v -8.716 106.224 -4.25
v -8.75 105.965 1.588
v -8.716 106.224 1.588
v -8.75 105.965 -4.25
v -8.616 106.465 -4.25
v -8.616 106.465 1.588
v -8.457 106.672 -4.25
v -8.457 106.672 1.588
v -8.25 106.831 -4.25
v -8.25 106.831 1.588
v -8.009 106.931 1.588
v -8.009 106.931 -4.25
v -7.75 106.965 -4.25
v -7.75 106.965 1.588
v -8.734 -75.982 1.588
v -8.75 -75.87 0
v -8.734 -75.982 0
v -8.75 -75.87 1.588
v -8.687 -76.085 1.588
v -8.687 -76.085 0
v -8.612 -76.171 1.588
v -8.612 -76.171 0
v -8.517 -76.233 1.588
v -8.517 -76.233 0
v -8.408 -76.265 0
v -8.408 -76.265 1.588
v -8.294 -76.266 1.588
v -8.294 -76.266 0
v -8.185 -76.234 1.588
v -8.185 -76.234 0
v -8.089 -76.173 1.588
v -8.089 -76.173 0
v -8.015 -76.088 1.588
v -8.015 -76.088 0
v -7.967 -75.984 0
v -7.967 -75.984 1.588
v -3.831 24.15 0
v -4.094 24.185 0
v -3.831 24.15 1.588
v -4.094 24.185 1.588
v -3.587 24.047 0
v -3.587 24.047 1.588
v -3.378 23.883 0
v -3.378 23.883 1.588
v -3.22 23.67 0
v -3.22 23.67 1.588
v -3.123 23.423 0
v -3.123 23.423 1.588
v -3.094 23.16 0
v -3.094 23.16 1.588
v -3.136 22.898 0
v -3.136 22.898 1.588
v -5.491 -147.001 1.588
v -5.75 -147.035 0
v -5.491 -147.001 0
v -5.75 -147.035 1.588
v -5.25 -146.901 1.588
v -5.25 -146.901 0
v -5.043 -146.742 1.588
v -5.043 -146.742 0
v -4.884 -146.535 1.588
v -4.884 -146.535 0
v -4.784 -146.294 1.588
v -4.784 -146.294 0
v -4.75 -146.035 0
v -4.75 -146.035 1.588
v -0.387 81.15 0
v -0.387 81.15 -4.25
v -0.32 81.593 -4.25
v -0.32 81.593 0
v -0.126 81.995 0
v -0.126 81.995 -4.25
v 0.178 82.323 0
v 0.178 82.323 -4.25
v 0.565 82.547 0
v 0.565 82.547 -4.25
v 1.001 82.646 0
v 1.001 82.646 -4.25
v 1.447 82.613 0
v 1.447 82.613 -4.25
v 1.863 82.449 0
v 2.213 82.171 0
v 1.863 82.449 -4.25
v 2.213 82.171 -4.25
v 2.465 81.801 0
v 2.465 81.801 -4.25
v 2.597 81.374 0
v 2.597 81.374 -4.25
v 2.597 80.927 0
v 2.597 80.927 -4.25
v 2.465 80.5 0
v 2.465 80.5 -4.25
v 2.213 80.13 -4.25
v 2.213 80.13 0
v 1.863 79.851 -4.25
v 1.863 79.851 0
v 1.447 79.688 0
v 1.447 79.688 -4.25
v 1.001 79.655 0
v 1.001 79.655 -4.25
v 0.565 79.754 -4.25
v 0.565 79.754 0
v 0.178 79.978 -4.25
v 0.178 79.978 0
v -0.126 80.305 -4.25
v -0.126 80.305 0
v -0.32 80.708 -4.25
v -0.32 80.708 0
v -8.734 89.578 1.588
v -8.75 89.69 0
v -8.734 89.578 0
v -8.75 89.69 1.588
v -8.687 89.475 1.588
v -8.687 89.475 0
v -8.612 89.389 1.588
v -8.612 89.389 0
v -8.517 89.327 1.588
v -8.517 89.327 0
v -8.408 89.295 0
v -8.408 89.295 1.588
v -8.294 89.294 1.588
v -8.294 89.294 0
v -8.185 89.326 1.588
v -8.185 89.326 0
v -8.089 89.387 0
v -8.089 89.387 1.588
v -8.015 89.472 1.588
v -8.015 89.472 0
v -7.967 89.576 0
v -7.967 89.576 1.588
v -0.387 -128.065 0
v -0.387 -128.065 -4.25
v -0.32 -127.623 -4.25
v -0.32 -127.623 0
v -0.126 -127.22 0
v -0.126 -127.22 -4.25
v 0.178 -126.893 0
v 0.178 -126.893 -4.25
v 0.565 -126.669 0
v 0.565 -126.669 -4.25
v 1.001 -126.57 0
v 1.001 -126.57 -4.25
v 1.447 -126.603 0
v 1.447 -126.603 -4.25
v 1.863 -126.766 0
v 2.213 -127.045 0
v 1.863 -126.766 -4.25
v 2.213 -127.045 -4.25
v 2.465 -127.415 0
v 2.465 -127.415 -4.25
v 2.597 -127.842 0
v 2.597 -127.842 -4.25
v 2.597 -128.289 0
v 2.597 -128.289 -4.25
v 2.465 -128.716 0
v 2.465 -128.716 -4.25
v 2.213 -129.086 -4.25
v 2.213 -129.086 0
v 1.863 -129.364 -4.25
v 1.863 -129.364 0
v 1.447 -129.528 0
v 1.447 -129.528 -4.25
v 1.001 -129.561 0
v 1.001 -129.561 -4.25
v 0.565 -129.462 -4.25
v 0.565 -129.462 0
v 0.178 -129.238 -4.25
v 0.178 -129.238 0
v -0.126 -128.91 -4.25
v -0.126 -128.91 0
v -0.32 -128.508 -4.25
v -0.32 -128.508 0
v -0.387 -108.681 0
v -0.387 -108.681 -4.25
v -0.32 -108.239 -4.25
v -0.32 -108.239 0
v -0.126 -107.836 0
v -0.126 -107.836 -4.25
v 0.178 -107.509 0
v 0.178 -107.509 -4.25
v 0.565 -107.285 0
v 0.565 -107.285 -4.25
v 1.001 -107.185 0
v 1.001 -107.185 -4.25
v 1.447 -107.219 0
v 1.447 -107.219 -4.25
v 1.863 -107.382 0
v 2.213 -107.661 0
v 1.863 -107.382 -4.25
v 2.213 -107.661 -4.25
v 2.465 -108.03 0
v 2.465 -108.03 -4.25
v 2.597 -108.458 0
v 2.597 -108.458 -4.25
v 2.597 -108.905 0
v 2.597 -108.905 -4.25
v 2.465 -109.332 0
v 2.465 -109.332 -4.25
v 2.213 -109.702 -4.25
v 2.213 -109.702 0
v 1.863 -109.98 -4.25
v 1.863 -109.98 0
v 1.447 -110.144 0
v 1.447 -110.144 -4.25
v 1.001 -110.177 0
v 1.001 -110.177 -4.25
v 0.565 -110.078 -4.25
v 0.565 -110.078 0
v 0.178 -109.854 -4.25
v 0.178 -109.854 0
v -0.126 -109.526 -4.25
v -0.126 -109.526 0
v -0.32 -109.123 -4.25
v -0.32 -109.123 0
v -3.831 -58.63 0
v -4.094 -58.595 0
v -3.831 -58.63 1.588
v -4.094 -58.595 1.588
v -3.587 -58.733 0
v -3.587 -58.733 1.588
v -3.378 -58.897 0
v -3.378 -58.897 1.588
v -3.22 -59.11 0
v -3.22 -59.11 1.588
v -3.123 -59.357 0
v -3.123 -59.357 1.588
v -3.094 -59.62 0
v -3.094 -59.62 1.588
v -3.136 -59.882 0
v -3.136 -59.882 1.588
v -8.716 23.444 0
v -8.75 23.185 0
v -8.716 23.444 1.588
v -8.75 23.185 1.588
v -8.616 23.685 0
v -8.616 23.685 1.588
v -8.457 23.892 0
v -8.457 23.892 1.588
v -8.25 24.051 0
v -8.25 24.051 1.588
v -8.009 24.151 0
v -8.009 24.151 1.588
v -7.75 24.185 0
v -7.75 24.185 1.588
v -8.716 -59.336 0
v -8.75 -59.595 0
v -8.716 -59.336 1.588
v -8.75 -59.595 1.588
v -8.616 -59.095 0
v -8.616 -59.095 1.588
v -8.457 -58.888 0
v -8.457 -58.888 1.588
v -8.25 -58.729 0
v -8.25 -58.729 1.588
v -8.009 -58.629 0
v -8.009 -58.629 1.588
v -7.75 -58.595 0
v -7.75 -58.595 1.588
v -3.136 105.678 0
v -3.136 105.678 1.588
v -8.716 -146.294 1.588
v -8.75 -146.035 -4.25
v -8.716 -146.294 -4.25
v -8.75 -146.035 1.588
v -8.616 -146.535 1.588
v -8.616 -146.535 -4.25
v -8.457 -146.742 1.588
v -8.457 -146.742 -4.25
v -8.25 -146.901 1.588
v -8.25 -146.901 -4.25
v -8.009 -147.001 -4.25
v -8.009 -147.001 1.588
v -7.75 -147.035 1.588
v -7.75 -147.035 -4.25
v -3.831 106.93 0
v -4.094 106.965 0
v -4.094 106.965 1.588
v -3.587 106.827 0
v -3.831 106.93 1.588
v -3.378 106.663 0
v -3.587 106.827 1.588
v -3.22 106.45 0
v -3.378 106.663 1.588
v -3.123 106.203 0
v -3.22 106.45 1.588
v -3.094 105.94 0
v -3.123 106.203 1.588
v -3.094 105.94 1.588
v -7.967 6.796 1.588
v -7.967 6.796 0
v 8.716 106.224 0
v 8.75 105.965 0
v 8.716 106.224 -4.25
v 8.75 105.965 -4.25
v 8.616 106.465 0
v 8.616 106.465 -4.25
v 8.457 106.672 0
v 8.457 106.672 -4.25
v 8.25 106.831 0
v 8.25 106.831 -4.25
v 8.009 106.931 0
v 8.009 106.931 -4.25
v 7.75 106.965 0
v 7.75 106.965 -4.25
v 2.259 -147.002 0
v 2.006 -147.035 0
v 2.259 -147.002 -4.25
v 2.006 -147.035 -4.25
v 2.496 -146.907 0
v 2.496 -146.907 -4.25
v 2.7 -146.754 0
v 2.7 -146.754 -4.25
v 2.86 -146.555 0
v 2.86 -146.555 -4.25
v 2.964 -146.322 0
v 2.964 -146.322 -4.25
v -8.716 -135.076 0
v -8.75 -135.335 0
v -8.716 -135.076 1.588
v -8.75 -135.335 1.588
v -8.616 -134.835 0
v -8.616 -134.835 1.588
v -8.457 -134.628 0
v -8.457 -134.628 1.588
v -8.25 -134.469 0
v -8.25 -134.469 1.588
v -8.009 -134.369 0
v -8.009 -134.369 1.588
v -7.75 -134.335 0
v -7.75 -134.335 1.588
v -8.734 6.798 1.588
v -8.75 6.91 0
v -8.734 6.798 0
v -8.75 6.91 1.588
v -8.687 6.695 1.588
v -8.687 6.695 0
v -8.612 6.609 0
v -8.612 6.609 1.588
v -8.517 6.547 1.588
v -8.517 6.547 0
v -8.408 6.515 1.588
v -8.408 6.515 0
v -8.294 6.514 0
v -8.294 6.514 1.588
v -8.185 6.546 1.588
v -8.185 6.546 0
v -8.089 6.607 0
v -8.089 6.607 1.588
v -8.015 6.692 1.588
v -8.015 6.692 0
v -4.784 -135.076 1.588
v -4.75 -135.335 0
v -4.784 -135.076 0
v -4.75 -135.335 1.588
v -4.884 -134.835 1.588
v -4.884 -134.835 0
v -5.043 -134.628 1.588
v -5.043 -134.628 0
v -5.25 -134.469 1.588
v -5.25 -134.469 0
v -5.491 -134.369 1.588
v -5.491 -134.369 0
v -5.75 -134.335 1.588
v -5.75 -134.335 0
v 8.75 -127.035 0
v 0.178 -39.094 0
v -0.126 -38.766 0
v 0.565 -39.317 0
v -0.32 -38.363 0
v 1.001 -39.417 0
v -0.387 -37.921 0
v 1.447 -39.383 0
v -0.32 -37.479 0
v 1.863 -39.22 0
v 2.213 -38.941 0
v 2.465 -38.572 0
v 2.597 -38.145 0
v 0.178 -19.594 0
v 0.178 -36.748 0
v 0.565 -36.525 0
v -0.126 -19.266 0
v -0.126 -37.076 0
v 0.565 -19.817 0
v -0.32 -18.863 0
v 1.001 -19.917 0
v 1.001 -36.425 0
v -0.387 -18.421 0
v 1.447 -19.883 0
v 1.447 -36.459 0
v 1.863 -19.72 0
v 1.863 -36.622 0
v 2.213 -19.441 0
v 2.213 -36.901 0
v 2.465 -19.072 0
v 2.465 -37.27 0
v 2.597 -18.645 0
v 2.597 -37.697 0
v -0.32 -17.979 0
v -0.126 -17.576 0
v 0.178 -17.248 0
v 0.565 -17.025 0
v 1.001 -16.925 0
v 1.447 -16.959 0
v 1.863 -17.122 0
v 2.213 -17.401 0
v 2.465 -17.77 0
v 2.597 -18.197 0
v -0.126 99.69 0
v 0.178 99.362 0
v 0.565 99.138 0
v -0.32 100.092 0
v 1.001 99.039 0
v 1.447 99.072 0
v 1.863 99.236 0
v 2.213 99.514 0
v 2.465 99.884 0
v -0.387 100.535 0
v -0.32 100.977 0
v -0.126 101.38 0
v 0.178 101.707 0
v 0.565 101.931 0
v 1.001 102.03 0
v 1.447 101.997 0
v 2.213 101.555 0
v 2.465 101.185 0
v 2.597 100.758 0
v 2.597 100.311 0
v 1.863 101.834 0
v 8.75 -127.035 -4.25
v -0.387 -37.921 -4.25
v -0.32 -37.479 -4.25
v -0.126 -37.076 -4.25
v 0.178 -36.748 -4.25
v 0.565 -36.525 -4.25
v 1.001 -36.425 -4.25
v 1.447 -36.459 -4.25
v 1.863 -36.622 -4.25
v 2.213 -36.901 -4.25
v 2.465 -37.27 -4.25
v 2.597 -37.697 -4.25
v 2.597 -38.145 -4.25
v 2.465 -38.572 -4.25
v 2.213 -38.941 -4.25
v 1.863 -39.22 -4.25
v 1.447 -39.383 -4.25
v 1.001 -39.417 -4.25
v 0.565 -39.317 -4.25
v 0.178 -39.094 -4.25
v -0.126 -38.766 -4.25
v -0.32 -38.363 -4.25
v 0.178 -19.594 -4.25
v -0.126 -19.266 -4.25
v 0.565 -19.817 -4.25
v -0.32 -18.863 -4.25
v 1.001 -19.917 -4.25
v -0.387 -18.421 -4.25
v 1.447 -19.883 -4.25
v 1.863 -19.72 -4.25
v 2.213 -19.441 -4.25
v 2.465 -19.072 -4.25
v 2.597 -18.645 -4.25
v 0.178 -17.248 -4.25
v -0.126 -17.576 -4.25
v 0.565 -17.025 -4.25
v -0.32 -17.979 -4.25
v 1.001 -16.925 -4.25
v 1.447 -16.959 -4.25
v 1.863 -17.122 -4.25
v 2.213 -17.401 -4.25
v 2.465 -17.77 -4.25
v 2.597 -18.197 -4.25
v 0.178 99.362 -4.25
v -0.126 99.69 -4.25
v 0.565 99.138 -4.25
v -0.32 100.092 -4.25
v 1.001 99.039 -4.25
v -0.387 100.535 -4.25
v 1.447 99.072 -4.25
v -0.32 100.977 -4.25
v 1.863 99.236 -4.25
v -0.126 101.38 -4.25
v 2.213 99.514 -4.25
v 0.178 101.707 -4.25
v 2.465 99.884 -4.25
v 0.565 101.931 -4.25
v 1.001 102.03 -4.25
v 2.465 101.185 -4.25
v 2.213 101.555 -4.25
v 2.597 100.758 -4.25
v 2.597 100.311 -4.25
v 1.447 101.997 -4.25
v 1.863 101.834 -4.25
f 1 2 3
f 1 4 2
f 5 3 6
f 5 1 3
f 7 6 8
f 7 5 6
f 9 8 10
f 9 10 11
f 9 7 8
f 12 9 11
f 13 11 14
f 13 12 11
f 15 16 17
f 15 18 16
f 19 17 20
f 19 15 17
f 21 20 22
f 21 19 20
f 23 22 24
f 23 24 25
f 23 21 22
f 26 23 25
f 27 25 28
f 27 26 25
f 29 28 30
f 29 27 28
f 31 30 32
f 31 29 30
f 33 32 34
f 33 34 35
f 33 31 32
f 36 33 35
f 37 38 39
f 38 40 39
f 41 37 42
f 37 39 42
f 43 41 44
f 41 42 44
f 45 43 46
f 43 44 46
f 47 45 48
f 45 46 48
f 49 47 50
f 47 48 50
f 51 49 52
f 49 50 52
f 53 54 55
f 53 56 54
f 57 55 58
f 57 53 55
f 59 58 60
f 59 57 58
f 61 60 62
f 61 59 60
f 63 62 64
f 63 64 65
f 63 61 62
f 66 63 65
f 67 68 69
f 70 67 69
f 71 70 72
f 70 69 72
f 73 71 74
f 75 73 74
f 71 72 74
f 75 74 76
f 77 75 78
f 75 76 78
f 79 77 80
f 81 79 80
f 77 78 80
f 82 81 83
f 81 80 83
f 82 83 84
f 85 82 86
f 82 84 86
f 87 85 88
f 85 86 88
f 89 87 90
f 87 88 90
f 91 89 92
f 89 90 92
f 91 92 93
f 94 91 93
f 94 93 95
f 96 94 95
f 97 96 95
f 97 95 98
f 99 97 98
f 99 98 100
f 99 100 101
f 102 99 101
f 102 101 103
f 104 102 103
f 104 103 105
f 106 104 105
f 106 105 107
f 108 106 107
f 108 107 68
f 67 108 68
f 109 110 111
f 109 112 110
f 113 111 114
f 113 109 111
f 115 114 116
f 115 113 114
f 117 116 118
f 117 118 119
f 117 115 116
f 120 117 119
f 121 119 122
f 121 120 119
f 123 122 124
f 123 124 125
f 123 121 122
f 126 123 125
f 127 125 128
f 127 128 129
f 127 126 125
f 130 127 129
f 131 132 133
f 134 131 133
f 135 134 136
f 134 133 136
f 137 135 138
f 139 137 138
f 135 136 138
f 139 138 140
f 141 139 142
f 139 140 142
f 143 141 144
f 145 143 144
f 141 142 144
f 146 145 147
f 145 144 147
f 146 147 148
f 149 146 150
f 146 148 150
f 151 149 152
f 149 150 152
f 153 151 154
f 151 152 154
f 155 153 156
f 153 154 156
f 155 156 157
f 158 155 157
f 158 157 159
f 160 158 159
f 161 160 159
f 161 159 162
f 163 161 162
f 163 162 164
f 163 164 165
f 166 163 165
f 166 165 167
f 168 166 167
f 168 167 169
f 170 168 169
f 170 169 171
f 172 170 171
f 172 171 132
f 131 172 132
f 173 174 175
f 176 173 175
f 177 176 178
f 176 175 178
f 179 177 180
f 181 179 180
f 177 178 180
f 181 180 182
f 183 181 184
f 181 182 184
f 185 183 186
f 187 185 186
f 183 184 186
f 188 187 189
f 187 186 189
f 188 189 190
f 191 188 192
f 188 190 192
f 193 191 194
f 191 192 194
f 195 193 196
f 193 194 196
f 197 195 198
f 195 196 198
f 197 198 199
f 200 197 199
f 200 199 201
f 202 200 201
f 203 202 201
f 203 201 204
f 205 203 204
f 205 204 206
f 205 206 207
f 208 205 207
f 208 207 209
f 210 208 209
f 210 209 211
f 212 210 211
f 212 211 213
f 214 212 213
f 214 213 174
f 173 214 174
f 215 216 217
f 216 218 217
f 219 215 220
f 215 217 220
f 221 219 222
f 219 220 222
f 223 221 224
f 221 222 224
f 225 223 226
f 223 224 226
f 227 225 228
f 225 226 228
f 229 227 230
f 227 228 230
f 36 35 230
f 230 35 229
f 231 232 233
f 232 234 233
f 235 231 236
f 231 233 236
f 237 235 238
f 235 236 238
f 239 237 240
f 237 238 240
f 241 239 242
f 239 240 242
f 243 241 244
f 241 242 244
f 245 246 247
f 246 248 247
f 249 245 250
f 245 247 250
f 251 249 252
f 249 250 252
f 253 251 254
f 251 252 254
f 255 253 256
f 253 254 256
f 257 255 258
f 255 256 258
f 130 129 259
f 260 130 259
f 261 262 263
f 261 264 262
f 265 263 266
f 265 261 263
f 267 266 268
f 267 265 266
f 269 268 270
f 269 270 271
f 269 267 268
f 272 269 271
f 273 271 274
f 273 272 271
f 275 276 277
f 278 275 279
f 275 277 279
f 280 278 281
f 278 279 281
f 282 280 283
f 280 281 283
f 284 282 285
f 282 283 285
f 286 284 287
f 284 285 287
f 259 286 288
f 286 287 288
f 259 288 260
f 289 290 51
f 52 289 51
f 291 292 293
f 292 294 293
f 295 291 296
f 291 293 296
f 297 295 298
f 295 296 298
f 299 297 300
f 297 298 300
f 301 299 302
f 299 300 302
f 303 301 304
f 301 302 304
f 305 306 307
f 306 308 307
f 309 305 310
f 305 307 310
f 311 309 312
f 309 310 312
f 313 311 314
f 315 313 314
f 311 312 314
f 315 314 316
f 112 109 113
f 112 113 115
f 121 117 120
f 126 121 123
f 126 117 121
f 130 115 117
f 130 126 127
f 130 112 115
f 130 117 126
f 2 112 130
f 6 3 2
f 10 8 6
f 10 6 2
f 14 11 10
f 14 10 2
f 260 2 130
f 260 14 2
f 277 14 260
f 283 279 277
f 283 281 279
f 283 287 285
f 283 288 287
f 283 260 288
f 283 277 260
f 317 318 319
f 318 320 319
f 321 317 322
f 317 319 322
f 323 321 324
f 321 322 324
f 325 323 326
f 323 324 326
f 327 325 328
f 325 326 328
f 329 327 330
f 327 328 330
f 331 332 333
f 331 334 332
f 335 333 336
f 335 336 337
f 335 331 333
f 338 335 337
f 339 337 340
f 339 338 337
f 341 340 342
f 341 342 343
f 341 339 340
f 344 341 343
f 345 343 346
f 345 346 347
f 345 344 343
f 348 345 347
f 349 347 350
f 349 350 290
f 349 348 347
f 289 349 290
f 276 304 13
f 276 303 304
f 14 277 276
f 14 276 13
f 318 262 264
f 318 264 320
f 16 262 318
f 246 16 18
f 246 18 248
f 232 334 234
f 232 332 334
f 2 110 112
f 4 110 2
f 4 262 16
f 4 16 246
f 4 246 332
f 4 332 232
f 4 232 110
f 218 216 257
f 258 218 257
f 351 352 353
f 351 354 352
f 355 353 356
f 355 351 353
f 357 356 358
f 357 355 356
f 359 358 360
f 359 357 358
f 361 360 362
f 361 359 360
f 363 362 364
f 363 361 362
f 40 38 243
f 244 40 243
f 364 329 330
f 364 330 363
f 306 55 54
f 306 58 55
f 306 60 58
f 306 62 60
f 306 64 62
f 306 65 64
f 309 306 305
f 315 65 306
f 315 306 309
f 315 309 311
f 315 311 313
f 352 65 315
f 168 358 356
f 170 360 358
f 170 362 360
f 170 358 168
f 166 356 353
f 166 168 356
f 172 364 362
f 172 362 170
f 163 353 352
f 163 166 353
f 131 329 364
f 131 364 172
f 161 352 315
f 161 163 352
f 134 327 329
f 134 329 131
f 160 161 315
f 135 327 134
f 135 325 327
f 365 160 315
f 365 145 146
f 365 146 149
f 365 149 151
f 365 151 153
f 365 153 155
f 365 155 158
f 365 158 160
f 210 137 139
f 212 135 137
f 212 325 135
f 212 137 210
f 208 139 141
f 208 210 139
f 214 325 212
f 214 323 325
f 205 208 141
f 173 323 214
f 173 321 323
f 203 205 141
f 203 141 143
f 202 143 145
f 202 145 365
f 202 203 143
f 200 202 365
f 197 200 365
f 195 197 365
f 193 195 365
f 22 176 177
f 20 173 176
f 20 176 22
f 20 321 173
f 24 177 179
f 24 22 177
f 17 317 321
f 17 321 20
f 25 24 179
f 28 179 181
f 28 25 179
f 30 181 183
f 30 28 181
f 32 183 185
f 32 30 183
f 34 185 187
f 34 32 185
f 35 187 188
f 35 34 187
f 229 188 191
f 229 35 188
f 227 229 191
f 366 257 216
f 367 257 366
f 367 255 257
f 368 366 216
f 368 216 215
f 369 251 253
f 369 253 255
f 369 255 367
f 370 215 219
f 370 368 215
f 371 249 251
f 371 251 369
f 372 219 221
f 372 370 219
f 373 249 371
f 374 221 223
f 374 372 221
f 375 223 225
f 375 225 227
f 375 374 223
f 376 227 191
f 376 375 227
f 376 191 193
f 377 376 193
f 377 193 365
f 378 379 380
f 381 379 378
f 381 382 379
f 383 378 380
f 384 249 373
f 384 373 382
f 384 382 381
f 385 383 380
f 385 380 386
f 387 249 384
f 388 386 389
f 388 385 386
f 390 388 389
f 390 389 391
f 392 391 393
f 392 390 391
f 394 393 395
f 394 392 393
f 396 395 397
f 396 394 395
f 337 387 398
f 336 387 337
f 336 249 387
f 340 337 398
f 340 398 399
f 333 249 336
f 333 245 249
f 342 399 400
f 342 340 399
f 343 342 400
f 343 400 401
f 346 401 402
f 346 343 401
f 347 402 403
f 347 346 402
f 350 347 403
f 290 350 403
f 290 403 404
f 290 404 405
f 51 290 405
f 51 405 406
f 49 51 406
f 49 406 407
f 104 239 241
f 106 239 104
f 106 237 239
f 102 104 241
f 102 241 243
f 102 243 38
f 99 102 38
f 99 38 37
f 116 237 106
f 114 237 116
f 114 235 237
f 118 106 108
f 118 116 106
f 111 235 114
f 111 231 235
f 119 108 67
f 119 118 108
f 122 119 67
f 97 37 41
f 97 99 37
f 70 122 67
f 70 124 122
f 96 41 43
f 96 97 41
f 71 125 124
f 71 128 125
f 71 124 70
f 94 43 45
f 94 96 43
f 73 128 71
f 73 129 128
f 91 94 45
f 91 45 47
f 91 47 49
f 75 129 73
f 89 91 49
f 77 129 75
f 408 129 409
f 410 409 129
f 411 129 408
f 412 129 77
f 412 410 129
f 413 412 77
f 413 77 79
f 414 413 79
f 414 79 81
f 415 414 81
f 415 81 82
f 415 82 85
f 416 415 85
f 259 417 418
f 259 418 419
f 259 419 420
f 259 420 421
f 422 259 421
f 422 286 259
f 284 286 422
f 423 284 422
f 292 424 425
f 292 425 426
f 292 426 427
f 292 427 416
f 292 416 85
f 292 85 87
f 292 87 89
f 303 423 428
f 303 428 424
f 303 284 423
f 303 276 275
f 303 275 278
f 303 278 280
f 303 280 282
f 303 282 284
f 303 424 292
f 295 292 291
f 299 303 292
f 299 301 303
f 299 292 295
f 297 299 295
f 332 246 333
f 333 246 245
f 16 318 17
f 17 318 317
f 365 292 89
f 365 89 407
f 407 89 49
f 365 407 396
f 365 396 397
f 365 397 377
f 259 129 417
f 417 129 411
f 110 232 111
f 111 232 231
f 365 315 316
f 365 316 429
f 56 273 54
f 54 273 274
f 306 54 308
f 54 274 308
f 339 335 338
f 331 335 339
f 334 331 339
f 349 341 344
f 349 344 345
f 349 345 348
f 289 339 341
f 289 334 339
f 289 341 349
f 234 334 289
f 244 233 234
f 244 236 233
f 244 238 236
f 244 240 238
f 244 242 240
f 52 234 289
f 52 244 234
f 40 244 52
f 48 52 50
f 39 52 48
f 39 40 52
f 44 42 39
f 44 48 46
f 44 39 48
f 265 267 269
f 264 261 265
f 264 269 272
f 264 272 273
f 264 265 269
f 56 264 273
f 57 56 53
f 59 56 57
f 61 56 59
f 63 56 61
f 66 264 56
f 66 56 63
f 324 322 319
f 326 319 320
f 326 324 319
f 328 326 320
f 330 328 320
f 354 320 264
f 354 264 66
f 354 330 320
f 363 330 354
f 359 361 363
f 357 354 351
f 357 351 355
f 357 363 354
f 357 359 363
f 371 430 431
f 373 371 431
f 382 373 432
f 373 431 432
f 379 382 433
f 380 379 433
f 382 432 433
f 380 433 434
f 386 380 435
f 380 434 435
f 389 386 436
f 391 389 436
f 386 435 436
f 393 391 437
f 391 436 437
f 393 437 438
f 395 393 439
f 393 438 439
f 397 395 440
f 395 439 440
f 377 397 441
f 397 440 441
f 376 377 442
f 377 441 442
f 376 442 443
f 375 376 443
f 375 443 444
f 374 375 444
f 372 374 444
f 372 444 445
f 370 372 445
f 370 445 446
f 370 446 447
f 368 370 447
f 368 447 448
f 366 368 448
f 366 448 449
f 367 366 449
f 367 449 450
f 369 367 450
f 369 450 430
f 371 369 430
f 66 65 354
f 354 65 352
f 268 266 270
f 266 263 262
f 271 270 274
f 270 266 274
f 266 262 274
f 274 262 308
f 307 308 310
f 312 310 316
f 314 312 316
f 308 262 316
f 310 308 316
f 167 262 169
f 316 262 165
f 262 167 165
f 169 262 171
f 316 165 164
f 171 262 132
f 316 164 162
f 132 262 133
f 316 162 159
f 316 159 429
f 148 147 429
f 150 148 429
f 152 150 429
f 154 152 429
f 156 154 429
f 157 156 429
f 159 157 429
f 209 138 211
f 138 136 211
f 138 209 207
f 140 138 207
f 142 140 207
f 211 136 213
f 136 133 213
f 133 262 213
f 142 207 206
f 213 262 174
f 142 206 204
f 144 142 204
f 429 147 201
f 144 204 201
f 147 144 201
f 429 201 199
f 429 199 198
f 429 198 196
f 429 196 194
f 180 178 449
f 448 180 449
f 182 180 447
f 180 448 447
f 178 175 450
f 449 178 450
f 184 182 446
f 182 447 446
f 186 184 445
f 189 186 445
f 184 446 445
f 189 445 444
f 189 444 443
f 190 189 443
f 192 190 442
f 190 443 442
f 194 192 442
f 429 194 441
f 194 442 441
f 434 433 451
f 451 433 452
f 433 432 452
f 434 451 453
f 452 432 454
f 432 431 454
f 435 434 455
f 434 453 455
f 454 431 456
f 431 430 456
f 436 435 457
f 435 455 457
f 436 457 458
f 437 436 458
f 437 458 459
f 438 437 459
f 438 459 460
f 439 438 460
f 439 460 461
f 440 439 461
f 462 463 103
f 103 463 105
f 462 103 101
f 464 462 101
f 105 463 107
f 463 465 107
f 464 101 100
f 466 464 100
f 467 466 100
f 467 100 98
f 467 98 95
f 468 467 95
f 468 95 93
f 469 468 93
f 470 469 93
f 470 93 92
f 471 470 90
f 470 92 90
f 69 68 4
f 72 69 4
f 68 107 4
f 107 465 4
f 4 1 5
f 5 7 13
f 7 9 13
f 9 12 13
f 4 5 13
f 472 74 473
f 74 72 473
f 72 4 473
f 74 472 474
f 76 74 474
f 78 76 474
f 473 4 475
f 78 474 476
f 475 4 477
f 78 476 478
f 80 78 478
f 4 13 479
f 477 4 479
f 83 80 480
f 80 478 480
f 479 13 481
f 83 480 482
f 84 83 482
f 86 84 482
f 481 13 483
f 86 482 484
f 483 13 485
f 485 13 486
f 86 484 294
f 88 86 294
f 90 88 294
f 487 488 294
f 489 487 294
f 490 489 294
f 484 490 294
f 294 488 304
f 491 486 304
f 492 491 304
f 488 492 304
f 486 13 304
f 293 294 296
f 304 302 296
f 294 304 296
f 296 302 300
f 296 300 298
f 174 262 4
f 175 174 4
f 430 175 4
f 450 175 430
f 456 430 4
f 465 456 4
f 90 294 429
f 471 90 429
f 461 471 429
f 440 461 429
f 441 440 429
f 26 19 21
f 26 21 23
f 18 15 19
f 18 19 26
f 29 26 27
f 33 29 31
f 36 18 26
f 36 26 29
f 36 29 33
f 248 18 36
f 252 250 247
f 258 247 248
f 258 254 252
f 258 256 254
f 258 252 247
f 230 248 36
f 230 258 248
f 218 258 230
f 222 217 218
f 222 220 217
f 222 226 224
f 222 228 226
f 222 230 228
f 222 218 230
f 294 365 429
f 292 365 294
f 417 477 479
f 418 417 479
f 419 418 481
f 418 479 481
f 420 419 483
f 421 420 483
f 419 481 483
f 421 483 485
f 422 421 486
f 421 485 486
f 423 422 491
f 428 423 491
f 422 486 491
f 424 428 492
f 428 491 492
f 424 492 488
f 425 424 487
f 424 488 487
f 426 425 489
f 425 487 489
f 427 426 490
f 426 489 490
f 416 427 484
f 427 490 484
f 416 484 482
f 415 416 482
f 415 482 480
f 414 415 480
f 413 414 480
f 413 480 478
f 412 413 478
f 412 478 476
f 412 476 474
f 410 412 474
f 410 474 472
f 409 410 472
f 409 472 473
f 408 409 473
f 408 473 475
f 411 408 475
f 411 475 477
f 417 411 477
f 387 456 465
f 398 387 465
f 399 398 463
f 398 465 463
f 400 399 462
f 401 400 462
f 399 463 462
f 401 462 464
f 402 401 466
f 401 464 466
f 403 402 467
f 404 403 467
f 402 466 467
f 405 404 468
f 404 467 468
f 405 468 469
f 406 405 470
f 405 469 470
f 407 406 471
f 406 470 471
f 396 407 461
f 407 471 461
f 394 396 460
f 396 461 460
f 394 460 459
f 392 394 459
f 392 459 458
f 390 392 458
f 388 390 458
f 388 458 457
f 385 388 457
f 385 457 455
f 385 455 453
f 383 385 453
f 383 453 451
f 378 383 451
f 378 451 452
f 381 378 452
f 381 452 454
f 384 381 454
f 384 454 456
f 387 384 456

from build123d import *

# Parameters (mm, degrees)
F1_DEPTH = 4.25
F2_W     = 4
F2_H     = 12.7
F3_DEPTH = 1.5875
F4_R     = 1
F5_F1_R  = 0.4
F5_F2_R  = 0.4
F5_F3_R  = 0.4
F7_D     = 3


with BuildPart() as f1:
    # F0 (on Top) → F1 (new body)
    with BuildSketch(Plane.XY):
        Polygon((8.75, 106.9650896668), (-8.75, 106.9650896668), (-8.75, -147.0349103332), (2.75, -147.0349103332), (8.75, -127.0346005735), align=None)
    extrude(amount=-F1_DEPTH)

    # F2 (on face) → F3 (join)
    with BuildSketch(Plane.XY):
        Polygon((-2.75, 24.1850896668), (-8.75, 24.1850896668), (-8.75, 4.1850896668), align=None)
        Polygon((-2.75, -58.5949103332), (-8.75, -58.5949103332), (-8.75, -78.5949103332), align=None)
        with Locations((-6.75, -140.6849103332)):
            Rectangle(F2_W, F2_H)
        Polygon((-2.75, 106.9650896668), (-8.75, 106.9650896668), (-8.75, 86.9650896668), align=None)
    extrude(amount=F3_DEPTH)

    # F4
    f4_edges = [f1.edges().sort_by_distance(p)[0] for p in [
        (-2.75, -58.59491, 0.79375),
        (-8.75, -58.59491, 0.79375),
        (-2.75, 24.18509, 0.79375),
        (-8.75, 24.18509, 0.79375),
        (-2.75, 106.96509, 0.79375),
        (-8.75, 106.96509, -1.33125),
        (8.75, 106.96509, -2.125),
        (-8.75, -147.03491, -1.33125),
        (-4.75, -147.03491, 0.79375),
        (-4.75, -134.33491, 0.79375),
        (-8.75, -134.33491, 0.79375),
        (2.75, -147.03491, -2.125),
    ]]
    fillet(f4_edges, radius=F4_R)

    # F5: fillet of radius 0.4 on 3 edges, made by hand

    # F5_f1
    f5_f1_edges = [f1.edges().sort_by_distance(p)[0] for p in [
        (-8.75, 86.9650896668, 0.79375),
    ]]
    fillet(f5_f1_edges, radius=F5_F1_R)

    # F5_f2
    f5_f2_edges = [f1.edges().sort_by_distance(p)[0] for p in [
        (-8.75, -78.5949103332, 0.79375),
    ]]
    fillet(f5_f2_edges, radius=F5_F2_R)

    # F5_f3
    f5_f3_edges = [f1.edges().sort_by_distance(p)[0] for p in [
        (-8.75, 4.1850896668, 0.79375),
    ]]
    fillet(f5_f3_edges, radius=F5_F3_R)

    # F7 (through all)
    with Locations(Plane.XY):
        with Locations((1.113455, 100.5345896668), (1.113455, 81.1504351225), (1.113455, -18.4210048775), (1.113455, -37.9210048775), (1.113455, -108.6812892063), (1.113455, -128.0654437506)):
            Hole(F7_D / 2)


solid = f1.part
